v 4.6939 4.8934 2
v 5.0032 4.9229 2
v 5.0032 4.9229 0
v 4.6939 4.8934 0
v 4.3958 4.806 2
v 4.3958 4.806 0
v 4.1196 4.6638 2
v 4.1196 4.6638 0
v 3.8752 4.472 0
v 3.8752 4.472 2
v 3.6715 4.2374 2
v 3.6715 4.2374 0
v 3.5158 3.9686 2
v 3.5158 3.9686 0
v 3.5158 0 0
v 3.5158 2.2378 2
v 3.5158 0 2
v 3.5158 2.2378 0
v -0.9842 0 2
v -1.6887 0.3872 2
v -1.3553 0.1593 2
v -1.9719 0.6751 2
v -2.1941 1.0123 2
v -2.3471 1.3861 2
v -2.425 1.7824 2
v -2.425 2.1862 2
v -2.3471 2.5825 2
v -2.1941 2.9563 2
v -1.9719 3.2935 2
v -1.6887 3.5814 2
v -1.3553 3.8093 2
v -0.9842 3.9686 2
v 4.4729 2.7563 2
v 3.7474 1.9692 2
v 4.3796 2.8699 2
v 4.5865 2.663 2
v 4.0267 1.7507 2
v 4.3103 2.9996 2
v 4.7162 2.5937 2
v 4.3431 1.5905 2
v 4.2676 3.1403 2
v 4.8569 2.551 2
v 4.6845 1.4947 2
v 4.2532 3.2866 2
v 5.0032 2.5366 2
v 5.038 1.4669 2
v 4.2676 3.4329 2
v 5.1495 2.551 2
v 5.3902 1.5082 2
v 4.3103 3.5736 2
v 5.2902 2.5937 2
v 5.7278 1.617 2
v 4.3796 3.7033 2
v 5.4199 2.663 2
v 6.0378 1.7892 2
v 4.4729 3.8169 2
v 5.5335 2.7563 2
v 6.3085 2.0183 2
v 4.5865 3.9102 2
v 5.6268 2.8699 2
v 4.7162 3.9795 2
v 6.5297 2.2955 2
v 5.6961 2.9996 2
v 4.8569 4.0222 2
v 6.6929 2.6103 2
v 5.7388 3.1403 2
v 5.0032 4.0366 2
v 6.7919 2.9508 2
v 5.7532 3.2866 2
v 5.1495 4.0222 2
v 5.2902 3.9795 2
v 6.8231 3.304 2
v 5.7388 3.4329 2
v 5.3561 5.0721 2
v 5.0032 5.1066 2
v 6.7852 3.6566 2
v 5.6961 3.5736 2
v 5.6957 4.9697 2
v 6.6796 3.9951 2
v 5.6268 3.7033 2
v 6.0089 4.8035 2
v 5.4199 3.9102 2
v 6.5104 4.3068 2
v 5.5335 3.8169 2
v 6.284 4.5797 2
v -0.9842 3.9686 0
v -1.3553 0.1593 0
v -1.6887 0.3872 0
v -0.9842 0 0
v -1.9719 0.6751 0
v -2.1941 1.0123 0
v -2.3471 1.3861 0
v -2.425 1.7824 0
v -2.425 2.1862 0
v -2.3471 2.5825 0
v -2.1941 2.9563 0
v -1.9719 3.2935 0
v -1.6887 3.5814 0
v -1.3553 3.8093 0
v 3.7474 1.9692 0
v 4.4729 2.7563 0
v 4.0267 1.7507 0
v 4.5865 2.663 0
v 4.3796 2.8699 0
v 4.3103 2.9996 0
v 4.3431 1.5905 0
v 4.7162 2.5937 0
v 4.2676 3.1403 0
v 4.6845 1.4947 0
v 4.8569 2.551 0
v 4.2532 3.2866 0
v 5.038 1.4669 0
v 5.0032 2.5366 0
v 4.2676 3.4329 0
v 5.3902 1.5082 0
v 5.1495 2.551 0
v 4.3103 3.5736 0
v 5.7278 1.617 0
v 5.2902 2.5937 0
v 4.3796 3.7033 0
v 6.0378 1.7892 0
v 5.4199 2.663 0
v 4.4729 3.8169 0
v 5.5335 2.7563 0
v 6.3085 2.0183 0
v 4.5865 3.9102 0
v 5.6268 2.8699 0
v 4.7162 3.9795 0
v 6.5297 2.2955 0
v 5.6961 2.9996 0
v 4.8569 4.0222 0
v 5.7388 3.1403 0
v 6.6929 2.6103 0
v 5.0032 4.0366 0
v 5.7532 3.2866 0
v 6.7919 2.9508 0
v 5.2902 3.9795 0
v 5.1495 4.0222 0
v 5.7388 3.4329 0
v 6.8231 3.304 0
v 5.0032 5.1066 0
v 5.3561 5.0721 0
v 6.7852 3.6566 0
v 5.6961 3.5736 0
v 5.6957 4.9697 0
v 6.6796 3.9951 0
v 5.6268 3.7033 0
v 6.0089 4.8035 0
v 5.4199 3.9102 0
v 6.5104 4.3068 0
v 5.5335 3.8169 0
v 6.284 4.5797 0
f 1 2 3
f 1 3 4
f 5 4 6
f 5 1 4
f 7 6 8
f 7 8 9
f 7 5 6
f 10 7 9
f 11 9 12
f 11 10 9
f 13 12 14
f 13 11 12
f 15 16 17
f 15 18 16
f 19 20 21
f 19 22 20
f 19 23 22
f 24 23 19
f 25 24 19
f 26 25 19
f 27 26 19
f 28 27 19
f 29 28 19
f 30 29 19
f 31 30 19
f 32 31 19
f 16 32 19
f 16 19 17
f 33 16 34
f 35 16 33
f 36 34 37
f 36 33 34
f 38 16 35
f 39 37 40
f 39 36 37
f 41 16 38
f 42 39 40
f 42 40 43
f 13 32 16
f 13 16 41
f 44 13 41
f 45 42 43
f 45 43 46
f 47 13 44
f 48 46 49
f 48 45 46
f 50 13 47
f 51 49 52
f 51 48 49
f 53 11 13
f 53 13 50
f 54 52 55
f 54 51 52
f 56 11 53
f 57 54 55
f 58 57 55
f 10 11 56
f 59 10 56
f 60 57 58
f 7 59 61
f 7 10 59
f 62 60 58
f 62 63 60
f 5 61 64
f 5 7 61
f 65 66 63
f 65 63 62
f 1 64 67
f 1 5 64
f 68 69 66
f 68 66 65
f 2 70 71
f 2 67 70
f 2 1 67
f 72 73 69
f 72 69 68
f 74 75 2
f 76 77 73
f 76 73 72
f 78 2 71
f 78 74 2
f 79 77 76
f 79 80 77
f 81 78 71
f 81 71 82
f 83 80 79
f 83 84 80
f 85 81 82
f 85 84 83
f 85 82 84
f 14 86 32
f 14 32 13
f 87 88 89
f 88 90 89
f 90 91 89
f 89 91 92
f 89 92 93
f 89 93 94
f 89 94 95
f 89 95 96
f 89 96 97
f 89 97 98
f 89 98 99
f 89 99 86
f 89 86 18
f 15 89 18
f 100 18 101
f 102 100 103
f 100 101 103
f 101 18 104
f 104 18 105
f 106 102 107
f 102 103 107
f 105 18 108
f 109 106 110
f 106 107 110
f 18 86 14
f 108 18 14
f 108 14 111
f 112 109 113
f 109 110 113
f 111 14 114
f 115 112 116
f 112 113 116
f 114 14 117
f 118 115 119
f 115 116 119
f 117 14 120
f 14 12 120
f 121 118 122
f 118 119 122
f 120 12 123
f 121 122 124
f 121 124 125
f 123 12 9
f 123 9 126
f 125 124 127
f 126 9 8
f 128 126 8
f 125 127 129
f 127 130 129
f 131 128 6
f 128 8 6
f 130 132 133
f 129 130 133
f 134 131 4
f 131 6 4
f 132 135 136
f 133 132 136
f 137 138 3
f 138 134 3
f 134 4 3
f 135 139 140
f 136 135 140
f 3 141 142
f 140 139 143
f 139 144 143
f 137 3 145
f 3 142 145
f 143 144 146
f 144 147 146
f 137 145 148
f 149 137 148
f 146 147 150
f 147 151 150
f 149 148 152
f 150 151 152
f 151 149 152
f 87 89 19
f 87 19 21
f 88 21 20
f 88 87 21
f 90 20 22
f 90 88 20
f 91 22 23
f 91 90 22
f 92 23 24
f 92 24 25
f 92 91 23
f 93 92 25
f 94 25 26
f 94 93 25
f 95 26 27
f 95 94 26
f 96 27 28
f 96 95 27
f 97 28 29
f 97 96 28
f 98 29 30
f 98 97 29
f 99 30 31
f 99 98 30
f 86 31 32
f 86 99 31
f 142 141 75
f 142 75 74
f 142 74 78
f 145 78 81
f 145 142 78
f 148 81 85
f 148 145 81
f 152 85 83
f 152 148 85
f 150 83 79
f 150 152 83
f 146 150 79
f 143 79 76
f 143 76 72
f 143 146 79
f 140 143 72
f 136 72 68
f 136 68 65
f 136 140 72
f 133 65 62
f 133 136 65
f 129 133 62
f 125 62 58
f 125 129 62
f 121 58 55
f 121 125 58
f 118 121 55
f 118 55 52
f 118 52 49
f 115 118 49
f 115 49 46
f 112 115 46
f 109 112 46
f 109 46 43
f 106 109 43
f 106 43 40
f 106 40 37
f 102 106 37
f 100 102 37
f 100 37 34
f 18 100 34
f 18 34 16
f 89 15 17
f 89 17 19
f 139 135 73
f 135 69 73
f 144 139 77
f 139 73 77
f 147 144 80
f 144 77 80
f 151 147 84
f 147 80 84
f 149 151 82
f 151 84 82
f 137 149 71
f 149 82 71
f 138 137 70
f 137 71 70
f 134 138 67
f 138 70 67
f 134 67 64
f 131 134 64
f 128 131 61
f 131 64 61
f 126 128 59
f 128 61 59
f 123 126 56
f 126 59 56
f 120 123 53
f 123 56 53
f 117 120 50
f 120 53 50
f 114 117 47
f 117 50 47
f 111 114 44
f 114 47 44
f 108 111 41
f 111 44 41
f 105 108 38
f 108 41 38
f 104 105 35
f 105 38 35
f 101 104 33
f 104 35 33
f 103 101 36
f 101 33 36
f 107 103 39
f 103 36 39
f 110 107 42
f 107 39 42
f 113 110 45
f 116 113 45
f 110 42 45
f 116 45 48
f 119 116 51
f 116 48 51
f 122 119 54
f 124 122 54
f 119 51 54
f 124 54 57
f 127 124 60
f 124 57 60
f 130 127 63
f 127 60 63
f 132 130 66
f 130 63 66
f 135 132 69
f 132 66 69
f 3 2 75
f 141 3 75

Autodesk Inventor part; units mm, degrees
ref_plane "YZ Plane" through (0, 0, 0) normal (1, 0, 0) x (0, 1, 0)
ref_plane "XZ Plane" through (0, 0, 0) normal (0, 1, 0) x (-1, 0, 0)
ref_plane "XY Plane" through (0, 0, 0) normal (0, 0, 1) x (1, 0, 0)
sketch "Sketch1" plane through (0, 0, 0) normal (0, 0, 1) x (1, 0, 0)
  circle A0 centre (5.0032, 3.2866) radius 1.82
  point P0 (0, 0)
  dimension "d0" = 3.64
extrude "Extrusion1" add sketch "Sketch1" along normal blind 2
sketch "Sketch2" plane through (5.0032, 3.2866, 2) normal (0, 0, 1) x (1, 0, 0)
  circle A0 centre (0, 0) radius 0.75
  point P0 (-5.0032, -3.2866)
  dimension "d3" = 1.5
extrude "Extrusion2" cut sketch "Sketch2" against normal through all
sketch "Sketch3" plane through (5.0032, 3.2866, 2) normal (0, 0, 1) x (1, 0, 0)
  line L0 (0, -1.82) -> (0, -0.682) construction
  line L1 (-1.6874, -0.682) -> (-1.4874, -0.682)
  circle A0 centre (0, 0) radius 1.82 projected
  circle A1 centre (0, 0) radius 1.6363
  line L2 (0, 1.6363) -> (0, 1.82)
  point P0 (-5.0032, -3.2866)
  point P1 (0.02, 0)
  dimension "d6" = 1.138
  dimension "d7" = 0.2
extrude "Extrusion3" cut sketch "Sketch3" against normal through all contours A0 L2 A1 L1 picked at (-0.267, 1.7273)
sketch "Sketch5" plane through (0, 0, 0) normal (0, 0, -1) x (-1, 0, 0)
  line L0 (-3.3158, 2.6046) -> (-3.5158, 2.6046) projected
  arc A0 (-3.5158, 2.6046) -> (-5.0032, 4.9229) centre (-5.0032, 3.2866) ccw projected
  line L1 (-5.0032, 4.9229) -> (-5.0032, 5.1066) projected
  arc A1 (-5.0032, 5.1066) -> (-3.3158, 2.6046) centre (-5.0032, 3.2866) ccw projected
  circle A2 centre (-5.0032, 3.2866) radius 0.75 projected
  line L2 (-3.5158, 2.6046) -> (-3.5158, 2.2377) construction
  arc A3 (-5.0032, 5.1066) -> (-3.3158, 2.6046) centre (-5.0032, 3.2866) ccw projected
  line L3 (-3.5158, 3.9686) -> (-3.5158, 0)
  line L4 (-3.5158, 0) -> (0.9842, 0)
  line L5 (0.9842, 0) -> (0.9842, 3.9686)
  line L6 (0.9842, 3.9686) -> (-3.5158, 3.9686)
  arc A4 (0.9842, 0) -> (0.9842, 3.9686) centre (0.3524, 1.9843) ccw
  point P0 (0, 0)
  dimension "d18" = 4.5
extrude "Extrusion6" add sketch "Sketch5" against normal up to surface (2 mm away) contours L0 A0 L6 L5 L4 L3 A1 | A4 L5
properties material "Liga de Nickel-Copper 400"
